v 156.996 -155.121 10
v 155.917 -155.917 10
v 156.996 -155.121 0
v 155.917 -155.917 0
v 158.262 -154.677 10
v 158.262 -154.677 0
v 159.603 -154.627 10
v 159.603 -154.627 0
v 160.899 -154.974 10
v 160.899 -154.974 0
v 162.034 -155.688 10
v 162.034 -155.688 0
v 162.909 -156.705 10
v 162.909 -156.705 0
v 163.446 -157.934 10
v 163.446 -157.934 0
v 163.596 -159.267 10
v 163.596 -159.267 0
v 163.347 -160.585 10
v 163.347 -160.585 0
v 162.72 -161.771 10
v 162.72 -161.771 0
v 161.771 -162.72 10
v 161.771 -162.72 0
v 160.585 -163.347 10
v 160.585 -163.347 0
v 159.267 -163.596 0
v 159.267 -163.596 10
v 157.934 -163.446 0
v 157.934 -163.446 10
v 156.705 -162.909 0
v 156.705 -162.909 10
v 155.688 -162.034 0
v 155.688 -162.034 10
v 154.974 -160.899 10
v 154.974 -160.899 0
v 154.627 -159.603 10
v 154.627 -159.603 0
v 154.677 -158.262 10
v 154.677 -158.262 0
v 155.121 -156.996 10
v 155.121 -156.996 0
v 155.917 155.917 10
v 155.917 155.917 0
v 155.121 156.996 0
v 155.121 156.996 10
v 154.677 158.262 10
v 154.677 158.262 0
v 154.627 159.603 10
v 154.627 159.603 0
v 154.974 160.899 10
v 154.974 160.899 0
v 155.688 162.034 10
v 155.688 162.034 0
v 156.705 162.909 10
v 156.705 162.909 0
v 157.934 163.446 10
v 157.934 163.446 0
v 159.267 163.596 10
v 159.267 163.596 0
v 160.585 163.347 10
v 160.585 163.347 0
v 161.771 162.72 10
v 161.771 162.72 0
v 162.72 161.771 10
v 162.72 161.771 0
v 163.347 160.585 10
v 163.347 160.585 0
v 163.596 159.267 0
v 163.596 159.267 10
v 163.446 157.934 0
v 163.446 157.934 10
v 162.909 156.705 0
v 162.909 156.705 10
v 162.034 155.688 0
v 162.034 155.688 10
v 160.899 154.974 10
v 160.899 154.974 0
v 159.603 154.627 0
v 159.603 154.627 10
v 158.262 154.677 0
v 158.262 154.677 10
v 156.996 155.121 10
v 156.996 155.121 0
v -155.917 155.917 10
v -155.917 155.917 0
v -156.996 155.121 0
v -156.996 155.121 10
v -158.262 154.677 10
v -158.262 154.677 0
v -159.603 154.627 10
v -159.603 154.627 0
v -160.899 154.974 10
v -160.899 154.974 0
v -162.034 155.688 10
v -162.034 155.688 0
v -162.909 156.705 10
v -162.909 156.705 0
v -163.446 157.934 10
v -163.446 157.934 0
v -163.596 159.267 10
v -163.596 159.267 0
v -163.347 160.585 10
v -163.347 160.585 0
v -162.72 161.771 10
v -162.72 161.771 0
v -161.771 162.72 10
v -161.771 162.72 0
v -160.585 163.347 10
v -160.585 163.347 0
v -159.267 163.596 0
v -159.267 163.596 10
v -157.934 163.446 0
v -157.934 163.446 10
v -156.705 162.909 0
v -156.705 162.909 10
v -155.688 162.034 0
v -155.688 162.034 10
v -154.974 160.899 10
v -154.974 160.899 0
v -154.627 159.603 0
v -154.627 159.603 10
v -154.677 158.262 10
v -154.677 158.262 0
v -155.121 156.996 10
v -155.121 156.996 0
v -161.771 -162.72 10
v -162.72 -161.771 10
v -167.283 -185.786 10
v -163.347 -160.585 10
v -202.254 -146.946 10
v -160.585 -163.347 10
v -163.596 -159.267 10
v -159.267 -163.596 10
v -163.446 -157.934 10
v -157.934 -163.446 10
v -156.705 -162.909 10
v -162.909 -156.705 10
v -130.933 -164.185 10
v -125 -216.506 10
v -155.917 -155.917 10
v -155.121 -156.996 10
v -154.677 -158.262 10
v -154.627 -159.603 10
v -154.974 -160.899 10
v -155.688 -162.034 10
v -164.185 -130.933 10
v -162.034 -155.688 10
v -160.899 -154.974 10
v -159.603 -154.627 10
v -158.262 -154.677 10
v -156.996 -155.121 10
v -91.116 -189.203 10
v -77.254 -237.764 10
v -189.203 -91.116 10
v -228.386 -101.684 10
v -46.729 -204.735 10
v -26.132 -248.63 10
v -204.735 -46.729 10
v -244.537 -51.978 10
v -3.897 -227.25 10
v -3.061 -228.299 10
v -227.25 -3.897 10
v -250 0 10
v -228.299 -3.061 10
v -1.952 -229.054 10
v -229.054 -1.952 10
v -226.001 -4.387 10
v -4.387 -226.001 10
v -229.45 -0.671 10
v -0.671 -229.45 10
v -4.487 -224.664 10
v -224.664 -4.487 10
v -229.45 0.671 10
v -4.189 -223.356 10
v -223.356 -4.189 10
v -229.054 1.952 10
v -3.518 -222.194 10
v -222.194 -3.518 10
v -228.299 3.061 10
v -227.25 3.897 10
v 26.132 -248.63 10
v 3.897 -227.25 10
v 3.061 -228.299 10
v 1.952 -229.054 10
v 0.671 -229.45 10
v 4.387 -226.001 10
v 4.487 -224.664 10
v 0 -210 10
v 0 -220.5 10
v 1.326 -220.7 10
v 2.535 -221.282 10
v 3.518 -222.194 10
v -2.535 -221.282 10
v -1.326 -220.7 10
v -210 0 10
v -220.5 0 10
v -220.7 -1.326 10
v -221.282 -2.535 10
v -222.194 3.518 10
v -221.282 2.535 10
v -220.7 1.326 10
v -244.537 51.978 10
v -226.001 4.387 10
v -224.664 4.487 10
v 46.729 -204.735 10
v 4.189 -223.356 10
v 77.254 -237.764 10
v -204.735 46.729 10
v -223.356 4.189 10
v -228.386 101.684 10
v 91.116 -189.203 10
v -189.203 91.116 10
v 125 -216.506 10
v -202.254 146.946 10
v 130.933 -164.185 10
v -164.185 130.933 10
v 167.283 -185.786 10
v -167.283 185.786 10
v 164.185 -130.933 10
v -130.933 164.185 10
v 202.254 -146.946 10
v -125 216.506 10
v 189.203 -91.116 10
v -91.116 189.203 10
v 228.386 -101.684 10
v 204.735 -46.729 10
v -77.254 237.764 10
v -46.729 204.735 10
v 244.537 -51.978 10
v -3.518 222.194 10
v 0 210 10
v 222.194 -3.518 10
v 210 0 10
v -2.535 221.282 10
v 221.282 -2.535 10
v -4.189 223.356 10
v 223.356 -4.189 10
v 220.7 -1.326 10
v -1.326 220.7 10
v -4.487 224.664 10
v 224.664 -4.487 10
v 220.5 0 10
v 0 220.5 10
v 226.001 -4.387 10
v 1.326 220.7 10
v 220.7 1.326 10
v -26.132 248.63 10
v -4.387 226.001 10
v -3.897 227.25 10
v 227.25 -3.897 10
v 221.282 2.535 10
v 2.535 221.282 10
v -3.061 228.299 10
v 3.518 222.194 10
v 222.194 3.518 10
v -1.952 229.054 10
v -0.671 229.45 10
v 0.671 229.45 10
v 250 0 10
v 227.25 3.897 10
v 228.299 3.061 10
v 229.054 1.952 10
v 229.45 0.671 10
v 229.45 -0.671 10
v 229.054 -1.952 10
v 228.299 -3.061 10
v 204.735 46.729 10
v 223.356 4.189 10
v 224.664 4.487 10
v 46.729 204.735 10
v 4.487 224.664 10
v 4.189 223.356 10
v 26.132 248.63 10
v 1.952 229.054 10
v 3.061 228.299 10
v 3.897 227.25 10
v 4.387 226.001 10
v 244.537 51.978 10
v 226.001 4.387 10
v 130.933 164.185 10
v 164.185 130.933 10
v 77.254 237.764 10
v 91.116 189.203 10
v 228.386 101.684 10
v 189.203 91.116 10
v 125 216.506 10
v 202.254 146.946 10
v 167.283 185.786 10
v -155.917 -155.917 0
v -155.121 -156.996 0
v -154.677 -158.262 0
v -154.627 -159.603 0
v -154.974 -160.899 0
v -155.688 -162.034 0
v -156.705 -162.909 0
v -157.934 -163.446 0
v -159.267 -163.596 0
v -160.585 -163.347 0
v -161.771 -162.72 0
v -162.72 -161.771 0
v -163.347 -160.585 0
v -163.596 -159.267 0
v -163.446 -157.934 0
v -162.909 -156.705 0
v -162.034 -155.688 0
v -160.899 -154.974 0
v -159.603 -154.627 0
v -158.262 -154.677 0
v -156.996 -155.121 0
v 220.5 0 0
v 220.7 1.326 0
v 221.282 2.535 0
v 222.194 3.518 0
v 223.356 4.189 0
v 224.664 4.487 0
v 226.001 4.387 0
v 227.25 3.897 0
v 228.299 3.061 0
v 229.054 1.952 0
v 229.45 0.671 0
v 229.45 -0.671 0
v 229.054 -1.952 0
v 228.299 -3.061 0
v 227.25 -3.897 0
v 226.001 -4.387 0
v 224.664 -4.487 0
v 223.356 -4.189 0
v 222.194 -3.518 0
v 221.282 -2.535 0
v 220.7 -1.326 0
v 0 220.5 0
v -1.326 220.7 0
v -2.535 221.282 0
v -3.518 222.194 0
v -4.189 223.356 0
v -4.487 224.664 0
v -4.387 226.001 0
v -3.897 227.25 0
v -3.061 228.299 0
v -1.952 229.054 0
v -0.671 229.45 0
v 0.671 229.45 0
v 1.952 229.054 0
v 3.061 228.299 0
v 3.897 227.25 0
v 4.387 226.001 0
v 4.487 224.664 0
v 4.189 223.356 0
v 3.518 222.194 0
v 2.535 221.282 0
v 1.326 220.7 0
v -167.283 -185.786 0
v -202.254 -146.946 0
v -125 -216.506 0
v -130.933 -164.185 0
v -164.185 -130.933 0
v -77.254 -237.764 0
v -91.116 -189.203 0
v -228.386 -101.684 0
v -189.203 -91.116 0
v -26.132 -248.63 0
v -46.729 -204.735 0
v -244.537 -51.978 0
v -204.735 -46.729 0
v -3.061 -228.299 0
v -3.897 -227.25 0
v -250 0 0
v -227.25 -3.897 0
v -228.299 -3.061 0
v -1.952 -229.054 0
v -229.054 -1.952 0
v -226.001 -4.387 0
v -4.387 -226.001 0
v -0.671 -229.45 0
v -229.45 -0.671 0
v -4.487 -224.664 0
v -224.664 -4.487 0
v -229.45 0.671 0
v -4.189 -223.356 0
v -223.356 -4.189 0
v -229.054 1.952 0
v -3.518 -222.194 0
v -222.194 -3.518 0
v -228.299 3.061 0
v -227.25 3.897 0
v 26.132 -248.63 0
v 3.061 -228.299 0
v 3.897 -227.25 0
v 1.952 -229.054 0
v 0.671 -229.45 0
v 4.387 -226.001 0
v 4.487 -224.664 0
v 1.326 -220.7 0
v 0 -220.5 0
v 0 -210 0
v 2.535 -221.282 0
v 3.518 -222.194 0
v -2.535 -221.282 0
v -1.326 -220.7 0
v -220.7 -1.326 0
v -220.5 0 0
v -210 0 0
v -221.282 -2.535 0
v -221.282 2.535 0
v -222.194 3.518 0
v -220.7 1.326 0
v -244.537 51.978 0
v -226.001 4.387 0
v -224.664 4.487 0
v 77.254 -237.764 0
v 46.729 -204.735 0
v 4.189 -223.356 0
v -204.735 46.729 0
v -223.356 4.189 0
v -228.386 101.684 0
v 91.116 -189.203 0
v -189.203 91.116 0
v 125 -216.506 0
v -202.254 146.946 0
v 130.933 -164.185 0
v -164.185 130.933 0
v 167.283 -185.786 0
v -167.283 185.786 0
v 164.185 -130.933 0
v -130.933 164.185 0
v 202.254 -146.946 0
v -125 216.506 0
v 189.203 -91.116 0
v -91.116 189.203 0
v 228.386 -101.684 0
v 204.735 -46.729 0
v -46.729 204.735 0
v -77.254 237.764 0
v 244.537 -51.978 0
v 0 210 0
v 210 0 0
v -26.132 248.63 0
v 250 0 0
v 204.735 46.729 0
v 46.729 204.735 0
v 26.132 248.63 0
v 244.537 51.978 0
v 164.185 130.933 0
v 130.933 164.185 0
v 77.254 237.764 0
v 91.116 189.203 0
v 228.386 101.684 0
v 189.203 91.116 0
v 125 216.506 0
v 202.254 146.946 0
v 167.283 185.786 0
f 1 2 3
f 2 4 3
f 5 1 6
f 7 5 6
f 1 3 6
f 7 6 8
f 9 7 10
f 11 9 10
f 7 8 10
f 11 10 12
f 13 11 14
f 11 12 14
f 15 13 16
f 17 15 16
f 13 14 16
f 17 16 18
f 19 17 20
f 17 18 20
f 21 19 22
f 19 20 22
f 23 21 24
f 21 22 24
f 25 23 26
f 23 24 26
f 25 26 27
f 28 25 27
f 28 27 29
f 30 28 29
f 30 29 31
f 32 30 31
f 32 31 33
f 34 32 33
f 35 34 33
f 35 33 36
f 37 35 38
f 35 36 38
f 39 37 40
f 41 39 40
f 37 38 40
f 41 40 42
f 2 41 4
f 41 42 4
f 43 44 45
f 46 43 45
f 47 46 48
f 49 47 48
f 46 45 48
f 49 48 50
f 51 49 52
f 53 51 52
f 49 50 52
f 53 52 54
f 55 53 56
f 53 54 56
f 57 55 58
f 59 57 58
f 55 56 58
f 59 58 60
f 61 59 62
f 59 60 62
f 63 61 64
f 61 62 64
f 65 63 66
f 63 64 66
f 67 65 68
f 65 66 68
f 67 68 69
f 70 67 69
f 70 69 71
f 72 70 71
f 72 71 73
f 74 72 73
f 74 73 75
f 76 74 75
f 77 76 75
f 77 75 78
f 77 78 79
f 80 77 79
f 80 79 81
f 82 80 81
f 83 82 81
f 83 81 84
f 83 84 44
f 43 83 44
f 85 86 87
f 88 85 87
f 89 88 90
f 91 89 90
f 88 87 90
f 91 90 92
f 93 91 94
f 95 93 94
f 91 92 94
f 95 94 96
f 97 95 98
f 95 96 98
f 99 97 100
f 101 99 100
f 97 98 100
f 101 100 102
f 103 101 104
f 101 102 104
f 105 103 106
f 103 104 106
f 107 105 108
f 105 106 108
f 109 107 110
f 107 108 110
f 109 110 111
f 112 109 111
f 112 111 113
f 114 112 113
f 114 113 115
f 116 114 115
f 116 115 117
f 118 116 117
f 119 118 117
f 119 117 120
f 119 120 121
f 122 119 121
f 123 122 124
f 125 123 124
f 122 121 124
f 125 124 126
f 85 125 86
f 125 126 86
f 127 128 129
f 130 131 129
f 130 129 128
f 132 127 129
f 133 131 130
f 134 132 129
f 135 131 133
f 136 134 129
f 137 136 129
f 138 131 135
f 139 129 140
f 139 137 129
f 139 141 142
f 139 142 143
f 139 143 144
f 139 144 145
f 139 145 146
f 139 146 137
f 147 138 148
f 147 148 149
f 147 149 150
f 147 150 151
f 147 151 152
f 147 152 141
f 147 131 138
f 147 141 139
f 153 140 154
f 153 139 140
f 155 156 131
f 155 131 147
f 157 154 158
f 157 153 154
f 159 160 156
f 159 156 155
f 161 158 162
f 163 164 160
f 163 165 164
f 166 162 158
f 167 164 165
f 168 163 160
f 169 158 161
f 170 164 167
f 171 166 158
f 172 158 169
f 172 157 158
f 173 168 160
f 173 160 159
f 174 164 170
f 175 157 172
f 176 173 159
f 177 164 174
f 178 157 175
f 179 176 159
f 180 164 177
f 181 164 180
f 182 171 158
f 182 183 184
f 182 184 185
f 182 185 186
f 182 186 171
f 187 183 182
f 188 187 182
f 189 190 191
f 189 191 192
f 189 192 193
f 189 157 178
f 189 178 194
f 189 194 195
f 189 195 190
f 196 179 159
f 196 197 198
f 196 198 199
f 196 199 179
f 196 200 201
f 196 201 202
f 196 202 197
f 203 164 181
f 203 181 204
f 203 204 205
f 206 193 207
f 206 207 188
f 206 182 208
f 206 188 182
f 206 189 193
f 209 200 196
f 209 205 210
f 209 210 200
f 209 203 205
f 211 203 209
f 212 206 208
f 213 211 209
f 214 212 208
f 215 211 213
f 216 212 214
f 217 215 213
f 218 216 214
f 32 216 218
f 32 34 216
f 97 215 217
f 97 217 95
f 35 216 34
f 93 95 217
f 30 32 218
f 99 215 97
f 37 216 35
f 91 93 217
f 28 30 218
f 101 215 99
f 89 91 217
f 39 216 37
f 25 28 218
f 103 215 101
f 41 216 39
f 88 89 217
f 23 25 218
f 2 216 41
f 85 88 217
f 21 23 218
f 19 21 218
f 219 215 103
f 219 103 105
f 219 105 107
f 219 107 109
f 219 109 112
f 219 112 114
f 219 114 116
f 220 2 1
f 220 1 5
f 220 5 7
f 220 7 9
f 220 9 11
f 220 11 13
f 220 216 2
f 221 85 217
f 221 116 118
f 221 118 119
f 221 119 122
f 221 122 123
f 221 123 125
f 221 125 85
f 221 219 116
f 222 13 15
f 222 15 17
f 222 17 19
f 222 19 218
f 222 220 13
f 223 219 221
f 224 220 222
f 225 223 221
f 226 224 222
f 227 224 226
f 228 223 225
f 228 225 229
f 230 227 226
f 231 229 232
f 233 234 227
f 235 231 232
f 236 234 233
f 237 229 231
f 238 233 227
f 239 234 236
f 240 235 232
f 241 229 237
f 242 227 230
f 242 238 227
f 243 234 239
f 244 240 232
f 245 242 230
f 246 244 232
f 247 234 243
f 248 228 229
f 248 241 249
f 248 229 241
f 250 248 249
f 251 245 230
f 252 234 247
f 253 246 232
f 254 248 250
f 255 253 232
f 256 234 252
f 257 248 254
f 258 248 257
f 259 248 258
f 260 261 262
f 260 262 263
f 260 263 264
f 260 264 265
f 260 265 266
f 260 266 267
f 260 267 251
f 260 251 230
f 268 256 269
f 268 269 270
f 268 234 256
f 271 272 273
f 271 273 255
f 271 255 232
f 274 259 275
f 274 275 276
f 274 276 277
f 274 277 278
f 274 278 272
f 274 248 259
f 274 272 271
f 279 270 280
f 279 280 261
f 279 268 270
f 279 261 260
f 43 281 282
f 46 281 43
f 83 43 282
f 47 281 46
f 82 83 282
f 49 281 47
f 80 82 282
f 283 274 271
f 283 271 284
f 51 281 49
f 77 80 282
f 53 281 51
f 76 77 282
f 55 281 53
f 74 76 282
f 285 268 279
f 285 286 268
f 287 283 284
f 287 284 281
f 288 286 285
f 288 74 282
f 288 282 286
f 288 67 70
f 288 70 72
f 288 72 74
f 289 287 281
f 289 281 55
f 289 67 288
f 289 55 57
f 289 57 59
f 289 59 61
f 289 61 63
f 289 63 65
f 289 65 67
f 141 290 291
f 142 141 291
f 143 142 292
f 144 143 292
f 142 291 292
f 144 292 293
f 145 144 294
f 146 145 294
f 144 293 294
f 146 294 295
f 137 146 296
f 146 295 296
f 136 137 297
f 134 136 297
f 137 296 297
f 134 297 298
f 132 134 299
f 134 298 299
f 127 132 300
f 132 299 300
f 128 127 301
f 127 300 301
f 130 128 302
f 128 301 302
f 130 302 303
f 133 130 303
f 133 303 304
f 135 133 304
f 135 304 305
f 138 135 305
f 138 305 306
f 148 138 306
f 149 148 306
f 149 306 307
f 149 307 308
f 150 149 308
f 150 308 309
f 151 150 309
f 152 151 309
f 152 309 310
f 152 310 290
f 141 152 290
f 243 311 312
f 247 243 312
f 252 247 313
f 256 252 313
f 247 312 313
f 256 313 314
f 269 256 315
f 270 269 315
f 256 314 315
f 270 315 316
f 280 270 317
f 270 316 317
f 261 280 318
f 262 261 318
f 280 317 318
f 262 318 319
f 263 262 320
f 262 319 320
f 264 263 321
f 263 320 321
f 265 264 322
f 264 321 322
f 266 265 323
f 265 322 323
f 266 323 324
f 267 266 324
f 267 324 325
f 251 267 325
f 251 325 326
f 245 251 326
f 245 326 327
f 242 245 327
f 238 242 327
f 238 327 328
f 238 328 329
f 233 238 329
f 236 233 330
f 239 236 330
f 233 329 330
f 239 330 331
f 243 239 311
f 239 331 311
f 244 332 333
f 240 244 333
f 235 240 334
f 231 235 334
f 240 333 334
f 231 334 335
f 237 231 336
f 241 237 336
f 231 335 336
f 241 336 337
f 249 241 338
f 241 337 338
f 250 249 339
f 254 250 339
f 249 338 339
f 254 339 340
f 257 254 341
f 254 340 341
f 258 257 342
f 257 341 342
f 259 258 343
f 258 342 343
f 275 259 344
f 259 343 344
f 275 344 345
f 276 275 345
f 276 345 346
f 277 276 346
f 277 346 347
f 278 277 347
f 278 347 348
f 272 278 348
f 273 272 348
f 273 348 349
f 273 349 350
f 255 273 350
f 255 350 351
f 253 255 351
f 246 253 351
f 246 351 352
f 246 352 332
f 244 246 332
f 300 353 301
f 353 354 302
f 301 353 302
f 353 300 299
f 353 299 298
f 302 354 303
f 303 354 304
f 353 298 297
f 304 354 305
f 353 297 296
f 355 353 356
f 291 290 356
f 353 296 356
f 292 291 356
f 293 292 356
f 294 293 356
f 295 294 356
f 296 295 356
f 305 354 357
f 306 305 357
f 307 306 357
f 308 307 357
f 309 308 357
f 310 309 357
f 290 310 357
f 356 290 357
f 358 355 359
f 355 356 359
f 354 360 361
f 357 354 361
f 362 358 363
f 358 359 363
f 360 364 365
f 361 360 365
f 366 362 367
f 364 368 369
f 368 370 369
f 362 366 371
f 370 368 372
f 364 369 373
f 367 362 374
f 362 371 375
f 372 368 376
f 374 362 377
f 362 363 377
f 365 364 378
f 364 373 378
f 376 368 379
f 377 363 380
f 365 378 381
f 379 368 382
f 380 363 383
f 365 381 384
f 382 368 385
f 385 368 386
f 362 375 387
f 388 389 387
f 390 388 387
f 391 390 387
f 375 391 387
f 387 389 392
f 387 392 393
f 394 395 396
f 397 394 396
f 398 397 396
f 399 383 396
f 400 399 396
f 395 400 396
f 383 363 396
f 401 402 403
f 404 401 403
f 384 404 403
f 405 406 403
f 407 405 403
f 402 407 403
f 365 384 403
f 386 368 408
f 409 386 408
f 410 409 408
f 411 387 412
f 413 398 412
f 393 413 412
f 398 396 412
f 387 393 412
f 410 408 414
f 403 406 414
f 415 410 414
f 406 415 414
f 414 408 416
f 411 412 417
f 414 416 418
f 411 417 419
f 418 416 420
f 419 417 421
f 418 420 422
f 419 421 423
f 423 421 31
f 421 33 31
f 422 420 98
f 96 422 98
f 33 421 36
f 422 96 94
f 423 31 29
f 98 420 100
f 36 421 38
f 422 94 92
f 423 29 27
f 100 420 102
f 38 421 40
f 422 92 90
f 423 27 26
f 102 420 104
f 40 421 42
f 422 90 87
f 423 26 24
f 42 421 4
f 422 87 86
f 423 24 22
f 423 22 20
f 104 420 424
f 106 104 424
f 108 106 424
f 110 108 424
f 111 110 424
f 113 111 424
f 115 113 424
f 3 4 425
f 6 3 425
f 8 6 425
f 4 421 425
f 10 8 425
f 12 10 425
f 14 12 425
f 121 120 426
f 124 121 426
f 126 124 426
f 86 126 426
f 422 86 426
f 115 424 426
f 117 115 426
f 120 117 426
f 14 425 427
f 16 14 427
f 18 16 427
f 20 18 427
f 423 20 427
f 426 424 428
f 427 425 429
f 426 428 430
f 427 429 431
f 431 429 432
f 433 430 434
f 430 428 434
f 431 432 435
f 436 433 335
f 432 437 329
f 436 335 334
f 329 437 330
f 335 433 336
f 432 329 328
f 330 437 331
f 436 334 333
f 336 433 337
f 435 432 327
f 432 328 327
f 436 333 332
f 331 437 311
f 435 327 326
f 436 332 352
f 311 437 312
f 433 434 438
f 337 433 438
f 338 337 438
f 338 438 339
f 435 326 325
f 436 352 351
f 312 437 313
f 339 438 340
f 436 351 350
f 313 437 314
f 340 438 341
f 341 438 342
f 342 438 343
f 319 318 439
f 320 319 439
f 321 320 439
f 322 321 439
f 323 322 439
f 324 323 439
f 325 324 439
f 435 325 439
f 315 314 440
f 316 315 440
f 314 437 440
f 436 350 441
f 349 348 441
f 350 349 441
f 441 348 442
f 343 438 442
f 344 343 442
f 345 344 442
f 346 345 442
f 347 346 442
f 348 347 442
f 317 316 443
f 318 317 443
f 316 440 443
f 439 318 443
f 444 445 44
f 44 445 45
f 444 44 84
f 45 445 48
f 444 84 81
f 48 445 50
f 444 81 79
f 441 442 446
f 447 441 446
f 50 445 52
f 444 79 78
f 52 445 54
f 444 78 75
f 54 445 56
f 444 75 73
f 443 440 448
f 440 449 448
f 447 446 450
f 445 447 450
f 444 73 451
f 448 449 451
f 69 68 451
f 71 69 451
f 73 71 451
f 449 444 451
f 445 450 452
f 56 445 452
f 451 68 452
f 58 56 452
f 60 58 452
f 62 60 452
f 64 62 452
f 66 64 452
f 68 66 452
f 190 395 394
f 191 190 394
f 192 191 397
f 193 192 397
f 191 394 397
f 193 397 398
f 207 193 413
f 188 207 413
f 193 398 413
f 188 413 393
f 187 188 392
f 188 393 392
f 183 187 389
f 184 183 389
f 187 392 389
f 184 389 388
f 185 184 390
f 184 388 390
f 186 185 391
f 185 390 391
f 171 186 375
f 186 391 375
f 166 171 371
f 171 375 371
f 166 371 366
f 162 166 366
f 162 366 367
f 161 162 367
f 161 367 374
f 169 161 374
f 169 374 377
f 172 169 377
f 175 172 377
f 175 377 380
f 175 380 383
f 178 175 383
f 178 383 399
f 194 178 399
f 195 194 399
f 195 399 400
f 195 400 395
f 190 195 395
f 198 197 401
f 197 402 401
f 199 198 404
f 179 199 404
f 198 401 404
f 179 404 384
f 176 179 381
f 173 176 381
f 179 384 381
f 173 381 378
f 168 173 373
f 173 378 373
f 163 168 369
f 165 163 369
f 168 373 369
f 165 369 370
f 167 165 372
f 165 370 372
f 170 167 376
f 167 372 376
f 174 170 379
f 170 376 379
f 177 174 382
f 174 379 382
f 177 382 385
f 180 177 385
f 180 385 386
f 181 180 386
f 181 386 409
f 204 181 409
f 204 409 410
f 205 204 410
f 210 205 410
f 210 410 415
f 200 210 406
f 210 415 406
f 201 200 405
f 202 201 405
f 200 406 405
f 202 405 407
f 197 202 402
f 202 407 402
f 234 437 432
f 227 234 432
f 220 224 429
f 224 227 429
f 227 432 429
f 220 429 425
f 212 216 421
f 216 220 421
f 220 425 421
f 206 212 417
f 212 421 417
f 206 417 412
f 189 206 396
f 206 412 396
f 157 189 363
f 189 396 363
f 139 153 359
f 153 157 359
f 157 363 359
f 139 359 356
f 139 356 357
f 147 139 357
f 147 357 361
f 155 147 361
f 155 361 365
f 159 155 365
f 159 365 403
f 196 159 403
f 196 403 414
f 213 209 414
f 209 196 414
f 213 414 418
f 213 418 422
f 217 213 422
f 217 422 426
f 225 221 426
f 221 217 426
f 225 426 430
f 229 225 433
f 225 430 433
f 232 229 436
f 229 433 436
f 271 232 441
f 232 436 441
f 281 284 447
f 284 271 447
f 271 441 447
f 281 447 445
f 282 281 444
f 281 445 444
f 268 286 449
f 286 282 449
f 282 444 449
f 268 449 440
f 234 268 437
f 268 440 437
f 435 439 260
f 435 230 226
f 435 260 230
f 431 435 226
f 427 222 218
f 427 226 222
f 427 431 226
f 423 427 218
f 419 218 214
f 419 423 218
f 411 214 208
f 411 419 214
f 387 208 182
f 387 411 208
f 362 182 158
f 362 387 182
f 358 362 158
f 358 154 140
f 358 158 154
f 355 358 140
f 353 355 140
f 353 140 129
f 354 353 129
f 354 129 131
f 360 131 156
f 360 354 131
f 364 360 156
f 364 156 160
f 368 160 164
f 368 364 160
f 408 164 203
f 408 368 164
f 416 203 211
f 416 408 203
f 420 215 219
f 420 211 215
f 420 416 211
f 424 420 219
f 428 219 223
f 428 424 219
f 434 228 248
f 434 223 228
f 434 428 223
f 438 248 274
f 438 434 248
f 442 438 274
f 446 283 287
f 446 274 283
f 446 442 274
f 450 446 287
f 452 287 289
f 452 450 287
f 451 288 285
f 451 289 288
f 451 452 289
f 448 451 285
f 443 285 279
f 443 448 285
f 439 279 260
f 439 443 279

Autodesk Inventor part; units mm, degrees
ref_plane "YZ Plane" through (0, 0, 0) normal (1, 0, 0) x (0, 1, 0)
ref_plane "XZ Plane" through (0, 0, 0) normal (0, 1, 0) x (-1, 0, 0)
ref_plane "XY Plane" through (0, 0, 0) normal (0, 0, 1) x (1, 0, 0)
sketch "Sketch1" plane through (0, 0, 0) normal (0, 0, 1) x (1, 0, 0)
  circle A0 centre (0, 0) radius 250
  circle A1 centre (0, 0) radius 210
  dimension "d0" = 500
  dimension "d1" = 420
extrude "Extrusion1" add sketch "Sketch1" along normal blind 10
sketch "Sketch2" plane through (0, 0, 10) normal (0, 0, 1) x (1, 0, 0)
  circle A0 centre (0, 0) radius 225 construction
  circle A1 centre (0, 0) radius 210 projected
  point P0 (0, 225)
  dimension "d4" = 450
hole "Hole1" at (0, 225, 10) direction (0, 0, -1) diameter 9 end through all
pattern_circular "Circular Pattern1" count 8 over 360 about axis through (0, 0, 0) along (0, 0, 1) of "Hole1"
properties part number "Кольцо проект Алексенко"
